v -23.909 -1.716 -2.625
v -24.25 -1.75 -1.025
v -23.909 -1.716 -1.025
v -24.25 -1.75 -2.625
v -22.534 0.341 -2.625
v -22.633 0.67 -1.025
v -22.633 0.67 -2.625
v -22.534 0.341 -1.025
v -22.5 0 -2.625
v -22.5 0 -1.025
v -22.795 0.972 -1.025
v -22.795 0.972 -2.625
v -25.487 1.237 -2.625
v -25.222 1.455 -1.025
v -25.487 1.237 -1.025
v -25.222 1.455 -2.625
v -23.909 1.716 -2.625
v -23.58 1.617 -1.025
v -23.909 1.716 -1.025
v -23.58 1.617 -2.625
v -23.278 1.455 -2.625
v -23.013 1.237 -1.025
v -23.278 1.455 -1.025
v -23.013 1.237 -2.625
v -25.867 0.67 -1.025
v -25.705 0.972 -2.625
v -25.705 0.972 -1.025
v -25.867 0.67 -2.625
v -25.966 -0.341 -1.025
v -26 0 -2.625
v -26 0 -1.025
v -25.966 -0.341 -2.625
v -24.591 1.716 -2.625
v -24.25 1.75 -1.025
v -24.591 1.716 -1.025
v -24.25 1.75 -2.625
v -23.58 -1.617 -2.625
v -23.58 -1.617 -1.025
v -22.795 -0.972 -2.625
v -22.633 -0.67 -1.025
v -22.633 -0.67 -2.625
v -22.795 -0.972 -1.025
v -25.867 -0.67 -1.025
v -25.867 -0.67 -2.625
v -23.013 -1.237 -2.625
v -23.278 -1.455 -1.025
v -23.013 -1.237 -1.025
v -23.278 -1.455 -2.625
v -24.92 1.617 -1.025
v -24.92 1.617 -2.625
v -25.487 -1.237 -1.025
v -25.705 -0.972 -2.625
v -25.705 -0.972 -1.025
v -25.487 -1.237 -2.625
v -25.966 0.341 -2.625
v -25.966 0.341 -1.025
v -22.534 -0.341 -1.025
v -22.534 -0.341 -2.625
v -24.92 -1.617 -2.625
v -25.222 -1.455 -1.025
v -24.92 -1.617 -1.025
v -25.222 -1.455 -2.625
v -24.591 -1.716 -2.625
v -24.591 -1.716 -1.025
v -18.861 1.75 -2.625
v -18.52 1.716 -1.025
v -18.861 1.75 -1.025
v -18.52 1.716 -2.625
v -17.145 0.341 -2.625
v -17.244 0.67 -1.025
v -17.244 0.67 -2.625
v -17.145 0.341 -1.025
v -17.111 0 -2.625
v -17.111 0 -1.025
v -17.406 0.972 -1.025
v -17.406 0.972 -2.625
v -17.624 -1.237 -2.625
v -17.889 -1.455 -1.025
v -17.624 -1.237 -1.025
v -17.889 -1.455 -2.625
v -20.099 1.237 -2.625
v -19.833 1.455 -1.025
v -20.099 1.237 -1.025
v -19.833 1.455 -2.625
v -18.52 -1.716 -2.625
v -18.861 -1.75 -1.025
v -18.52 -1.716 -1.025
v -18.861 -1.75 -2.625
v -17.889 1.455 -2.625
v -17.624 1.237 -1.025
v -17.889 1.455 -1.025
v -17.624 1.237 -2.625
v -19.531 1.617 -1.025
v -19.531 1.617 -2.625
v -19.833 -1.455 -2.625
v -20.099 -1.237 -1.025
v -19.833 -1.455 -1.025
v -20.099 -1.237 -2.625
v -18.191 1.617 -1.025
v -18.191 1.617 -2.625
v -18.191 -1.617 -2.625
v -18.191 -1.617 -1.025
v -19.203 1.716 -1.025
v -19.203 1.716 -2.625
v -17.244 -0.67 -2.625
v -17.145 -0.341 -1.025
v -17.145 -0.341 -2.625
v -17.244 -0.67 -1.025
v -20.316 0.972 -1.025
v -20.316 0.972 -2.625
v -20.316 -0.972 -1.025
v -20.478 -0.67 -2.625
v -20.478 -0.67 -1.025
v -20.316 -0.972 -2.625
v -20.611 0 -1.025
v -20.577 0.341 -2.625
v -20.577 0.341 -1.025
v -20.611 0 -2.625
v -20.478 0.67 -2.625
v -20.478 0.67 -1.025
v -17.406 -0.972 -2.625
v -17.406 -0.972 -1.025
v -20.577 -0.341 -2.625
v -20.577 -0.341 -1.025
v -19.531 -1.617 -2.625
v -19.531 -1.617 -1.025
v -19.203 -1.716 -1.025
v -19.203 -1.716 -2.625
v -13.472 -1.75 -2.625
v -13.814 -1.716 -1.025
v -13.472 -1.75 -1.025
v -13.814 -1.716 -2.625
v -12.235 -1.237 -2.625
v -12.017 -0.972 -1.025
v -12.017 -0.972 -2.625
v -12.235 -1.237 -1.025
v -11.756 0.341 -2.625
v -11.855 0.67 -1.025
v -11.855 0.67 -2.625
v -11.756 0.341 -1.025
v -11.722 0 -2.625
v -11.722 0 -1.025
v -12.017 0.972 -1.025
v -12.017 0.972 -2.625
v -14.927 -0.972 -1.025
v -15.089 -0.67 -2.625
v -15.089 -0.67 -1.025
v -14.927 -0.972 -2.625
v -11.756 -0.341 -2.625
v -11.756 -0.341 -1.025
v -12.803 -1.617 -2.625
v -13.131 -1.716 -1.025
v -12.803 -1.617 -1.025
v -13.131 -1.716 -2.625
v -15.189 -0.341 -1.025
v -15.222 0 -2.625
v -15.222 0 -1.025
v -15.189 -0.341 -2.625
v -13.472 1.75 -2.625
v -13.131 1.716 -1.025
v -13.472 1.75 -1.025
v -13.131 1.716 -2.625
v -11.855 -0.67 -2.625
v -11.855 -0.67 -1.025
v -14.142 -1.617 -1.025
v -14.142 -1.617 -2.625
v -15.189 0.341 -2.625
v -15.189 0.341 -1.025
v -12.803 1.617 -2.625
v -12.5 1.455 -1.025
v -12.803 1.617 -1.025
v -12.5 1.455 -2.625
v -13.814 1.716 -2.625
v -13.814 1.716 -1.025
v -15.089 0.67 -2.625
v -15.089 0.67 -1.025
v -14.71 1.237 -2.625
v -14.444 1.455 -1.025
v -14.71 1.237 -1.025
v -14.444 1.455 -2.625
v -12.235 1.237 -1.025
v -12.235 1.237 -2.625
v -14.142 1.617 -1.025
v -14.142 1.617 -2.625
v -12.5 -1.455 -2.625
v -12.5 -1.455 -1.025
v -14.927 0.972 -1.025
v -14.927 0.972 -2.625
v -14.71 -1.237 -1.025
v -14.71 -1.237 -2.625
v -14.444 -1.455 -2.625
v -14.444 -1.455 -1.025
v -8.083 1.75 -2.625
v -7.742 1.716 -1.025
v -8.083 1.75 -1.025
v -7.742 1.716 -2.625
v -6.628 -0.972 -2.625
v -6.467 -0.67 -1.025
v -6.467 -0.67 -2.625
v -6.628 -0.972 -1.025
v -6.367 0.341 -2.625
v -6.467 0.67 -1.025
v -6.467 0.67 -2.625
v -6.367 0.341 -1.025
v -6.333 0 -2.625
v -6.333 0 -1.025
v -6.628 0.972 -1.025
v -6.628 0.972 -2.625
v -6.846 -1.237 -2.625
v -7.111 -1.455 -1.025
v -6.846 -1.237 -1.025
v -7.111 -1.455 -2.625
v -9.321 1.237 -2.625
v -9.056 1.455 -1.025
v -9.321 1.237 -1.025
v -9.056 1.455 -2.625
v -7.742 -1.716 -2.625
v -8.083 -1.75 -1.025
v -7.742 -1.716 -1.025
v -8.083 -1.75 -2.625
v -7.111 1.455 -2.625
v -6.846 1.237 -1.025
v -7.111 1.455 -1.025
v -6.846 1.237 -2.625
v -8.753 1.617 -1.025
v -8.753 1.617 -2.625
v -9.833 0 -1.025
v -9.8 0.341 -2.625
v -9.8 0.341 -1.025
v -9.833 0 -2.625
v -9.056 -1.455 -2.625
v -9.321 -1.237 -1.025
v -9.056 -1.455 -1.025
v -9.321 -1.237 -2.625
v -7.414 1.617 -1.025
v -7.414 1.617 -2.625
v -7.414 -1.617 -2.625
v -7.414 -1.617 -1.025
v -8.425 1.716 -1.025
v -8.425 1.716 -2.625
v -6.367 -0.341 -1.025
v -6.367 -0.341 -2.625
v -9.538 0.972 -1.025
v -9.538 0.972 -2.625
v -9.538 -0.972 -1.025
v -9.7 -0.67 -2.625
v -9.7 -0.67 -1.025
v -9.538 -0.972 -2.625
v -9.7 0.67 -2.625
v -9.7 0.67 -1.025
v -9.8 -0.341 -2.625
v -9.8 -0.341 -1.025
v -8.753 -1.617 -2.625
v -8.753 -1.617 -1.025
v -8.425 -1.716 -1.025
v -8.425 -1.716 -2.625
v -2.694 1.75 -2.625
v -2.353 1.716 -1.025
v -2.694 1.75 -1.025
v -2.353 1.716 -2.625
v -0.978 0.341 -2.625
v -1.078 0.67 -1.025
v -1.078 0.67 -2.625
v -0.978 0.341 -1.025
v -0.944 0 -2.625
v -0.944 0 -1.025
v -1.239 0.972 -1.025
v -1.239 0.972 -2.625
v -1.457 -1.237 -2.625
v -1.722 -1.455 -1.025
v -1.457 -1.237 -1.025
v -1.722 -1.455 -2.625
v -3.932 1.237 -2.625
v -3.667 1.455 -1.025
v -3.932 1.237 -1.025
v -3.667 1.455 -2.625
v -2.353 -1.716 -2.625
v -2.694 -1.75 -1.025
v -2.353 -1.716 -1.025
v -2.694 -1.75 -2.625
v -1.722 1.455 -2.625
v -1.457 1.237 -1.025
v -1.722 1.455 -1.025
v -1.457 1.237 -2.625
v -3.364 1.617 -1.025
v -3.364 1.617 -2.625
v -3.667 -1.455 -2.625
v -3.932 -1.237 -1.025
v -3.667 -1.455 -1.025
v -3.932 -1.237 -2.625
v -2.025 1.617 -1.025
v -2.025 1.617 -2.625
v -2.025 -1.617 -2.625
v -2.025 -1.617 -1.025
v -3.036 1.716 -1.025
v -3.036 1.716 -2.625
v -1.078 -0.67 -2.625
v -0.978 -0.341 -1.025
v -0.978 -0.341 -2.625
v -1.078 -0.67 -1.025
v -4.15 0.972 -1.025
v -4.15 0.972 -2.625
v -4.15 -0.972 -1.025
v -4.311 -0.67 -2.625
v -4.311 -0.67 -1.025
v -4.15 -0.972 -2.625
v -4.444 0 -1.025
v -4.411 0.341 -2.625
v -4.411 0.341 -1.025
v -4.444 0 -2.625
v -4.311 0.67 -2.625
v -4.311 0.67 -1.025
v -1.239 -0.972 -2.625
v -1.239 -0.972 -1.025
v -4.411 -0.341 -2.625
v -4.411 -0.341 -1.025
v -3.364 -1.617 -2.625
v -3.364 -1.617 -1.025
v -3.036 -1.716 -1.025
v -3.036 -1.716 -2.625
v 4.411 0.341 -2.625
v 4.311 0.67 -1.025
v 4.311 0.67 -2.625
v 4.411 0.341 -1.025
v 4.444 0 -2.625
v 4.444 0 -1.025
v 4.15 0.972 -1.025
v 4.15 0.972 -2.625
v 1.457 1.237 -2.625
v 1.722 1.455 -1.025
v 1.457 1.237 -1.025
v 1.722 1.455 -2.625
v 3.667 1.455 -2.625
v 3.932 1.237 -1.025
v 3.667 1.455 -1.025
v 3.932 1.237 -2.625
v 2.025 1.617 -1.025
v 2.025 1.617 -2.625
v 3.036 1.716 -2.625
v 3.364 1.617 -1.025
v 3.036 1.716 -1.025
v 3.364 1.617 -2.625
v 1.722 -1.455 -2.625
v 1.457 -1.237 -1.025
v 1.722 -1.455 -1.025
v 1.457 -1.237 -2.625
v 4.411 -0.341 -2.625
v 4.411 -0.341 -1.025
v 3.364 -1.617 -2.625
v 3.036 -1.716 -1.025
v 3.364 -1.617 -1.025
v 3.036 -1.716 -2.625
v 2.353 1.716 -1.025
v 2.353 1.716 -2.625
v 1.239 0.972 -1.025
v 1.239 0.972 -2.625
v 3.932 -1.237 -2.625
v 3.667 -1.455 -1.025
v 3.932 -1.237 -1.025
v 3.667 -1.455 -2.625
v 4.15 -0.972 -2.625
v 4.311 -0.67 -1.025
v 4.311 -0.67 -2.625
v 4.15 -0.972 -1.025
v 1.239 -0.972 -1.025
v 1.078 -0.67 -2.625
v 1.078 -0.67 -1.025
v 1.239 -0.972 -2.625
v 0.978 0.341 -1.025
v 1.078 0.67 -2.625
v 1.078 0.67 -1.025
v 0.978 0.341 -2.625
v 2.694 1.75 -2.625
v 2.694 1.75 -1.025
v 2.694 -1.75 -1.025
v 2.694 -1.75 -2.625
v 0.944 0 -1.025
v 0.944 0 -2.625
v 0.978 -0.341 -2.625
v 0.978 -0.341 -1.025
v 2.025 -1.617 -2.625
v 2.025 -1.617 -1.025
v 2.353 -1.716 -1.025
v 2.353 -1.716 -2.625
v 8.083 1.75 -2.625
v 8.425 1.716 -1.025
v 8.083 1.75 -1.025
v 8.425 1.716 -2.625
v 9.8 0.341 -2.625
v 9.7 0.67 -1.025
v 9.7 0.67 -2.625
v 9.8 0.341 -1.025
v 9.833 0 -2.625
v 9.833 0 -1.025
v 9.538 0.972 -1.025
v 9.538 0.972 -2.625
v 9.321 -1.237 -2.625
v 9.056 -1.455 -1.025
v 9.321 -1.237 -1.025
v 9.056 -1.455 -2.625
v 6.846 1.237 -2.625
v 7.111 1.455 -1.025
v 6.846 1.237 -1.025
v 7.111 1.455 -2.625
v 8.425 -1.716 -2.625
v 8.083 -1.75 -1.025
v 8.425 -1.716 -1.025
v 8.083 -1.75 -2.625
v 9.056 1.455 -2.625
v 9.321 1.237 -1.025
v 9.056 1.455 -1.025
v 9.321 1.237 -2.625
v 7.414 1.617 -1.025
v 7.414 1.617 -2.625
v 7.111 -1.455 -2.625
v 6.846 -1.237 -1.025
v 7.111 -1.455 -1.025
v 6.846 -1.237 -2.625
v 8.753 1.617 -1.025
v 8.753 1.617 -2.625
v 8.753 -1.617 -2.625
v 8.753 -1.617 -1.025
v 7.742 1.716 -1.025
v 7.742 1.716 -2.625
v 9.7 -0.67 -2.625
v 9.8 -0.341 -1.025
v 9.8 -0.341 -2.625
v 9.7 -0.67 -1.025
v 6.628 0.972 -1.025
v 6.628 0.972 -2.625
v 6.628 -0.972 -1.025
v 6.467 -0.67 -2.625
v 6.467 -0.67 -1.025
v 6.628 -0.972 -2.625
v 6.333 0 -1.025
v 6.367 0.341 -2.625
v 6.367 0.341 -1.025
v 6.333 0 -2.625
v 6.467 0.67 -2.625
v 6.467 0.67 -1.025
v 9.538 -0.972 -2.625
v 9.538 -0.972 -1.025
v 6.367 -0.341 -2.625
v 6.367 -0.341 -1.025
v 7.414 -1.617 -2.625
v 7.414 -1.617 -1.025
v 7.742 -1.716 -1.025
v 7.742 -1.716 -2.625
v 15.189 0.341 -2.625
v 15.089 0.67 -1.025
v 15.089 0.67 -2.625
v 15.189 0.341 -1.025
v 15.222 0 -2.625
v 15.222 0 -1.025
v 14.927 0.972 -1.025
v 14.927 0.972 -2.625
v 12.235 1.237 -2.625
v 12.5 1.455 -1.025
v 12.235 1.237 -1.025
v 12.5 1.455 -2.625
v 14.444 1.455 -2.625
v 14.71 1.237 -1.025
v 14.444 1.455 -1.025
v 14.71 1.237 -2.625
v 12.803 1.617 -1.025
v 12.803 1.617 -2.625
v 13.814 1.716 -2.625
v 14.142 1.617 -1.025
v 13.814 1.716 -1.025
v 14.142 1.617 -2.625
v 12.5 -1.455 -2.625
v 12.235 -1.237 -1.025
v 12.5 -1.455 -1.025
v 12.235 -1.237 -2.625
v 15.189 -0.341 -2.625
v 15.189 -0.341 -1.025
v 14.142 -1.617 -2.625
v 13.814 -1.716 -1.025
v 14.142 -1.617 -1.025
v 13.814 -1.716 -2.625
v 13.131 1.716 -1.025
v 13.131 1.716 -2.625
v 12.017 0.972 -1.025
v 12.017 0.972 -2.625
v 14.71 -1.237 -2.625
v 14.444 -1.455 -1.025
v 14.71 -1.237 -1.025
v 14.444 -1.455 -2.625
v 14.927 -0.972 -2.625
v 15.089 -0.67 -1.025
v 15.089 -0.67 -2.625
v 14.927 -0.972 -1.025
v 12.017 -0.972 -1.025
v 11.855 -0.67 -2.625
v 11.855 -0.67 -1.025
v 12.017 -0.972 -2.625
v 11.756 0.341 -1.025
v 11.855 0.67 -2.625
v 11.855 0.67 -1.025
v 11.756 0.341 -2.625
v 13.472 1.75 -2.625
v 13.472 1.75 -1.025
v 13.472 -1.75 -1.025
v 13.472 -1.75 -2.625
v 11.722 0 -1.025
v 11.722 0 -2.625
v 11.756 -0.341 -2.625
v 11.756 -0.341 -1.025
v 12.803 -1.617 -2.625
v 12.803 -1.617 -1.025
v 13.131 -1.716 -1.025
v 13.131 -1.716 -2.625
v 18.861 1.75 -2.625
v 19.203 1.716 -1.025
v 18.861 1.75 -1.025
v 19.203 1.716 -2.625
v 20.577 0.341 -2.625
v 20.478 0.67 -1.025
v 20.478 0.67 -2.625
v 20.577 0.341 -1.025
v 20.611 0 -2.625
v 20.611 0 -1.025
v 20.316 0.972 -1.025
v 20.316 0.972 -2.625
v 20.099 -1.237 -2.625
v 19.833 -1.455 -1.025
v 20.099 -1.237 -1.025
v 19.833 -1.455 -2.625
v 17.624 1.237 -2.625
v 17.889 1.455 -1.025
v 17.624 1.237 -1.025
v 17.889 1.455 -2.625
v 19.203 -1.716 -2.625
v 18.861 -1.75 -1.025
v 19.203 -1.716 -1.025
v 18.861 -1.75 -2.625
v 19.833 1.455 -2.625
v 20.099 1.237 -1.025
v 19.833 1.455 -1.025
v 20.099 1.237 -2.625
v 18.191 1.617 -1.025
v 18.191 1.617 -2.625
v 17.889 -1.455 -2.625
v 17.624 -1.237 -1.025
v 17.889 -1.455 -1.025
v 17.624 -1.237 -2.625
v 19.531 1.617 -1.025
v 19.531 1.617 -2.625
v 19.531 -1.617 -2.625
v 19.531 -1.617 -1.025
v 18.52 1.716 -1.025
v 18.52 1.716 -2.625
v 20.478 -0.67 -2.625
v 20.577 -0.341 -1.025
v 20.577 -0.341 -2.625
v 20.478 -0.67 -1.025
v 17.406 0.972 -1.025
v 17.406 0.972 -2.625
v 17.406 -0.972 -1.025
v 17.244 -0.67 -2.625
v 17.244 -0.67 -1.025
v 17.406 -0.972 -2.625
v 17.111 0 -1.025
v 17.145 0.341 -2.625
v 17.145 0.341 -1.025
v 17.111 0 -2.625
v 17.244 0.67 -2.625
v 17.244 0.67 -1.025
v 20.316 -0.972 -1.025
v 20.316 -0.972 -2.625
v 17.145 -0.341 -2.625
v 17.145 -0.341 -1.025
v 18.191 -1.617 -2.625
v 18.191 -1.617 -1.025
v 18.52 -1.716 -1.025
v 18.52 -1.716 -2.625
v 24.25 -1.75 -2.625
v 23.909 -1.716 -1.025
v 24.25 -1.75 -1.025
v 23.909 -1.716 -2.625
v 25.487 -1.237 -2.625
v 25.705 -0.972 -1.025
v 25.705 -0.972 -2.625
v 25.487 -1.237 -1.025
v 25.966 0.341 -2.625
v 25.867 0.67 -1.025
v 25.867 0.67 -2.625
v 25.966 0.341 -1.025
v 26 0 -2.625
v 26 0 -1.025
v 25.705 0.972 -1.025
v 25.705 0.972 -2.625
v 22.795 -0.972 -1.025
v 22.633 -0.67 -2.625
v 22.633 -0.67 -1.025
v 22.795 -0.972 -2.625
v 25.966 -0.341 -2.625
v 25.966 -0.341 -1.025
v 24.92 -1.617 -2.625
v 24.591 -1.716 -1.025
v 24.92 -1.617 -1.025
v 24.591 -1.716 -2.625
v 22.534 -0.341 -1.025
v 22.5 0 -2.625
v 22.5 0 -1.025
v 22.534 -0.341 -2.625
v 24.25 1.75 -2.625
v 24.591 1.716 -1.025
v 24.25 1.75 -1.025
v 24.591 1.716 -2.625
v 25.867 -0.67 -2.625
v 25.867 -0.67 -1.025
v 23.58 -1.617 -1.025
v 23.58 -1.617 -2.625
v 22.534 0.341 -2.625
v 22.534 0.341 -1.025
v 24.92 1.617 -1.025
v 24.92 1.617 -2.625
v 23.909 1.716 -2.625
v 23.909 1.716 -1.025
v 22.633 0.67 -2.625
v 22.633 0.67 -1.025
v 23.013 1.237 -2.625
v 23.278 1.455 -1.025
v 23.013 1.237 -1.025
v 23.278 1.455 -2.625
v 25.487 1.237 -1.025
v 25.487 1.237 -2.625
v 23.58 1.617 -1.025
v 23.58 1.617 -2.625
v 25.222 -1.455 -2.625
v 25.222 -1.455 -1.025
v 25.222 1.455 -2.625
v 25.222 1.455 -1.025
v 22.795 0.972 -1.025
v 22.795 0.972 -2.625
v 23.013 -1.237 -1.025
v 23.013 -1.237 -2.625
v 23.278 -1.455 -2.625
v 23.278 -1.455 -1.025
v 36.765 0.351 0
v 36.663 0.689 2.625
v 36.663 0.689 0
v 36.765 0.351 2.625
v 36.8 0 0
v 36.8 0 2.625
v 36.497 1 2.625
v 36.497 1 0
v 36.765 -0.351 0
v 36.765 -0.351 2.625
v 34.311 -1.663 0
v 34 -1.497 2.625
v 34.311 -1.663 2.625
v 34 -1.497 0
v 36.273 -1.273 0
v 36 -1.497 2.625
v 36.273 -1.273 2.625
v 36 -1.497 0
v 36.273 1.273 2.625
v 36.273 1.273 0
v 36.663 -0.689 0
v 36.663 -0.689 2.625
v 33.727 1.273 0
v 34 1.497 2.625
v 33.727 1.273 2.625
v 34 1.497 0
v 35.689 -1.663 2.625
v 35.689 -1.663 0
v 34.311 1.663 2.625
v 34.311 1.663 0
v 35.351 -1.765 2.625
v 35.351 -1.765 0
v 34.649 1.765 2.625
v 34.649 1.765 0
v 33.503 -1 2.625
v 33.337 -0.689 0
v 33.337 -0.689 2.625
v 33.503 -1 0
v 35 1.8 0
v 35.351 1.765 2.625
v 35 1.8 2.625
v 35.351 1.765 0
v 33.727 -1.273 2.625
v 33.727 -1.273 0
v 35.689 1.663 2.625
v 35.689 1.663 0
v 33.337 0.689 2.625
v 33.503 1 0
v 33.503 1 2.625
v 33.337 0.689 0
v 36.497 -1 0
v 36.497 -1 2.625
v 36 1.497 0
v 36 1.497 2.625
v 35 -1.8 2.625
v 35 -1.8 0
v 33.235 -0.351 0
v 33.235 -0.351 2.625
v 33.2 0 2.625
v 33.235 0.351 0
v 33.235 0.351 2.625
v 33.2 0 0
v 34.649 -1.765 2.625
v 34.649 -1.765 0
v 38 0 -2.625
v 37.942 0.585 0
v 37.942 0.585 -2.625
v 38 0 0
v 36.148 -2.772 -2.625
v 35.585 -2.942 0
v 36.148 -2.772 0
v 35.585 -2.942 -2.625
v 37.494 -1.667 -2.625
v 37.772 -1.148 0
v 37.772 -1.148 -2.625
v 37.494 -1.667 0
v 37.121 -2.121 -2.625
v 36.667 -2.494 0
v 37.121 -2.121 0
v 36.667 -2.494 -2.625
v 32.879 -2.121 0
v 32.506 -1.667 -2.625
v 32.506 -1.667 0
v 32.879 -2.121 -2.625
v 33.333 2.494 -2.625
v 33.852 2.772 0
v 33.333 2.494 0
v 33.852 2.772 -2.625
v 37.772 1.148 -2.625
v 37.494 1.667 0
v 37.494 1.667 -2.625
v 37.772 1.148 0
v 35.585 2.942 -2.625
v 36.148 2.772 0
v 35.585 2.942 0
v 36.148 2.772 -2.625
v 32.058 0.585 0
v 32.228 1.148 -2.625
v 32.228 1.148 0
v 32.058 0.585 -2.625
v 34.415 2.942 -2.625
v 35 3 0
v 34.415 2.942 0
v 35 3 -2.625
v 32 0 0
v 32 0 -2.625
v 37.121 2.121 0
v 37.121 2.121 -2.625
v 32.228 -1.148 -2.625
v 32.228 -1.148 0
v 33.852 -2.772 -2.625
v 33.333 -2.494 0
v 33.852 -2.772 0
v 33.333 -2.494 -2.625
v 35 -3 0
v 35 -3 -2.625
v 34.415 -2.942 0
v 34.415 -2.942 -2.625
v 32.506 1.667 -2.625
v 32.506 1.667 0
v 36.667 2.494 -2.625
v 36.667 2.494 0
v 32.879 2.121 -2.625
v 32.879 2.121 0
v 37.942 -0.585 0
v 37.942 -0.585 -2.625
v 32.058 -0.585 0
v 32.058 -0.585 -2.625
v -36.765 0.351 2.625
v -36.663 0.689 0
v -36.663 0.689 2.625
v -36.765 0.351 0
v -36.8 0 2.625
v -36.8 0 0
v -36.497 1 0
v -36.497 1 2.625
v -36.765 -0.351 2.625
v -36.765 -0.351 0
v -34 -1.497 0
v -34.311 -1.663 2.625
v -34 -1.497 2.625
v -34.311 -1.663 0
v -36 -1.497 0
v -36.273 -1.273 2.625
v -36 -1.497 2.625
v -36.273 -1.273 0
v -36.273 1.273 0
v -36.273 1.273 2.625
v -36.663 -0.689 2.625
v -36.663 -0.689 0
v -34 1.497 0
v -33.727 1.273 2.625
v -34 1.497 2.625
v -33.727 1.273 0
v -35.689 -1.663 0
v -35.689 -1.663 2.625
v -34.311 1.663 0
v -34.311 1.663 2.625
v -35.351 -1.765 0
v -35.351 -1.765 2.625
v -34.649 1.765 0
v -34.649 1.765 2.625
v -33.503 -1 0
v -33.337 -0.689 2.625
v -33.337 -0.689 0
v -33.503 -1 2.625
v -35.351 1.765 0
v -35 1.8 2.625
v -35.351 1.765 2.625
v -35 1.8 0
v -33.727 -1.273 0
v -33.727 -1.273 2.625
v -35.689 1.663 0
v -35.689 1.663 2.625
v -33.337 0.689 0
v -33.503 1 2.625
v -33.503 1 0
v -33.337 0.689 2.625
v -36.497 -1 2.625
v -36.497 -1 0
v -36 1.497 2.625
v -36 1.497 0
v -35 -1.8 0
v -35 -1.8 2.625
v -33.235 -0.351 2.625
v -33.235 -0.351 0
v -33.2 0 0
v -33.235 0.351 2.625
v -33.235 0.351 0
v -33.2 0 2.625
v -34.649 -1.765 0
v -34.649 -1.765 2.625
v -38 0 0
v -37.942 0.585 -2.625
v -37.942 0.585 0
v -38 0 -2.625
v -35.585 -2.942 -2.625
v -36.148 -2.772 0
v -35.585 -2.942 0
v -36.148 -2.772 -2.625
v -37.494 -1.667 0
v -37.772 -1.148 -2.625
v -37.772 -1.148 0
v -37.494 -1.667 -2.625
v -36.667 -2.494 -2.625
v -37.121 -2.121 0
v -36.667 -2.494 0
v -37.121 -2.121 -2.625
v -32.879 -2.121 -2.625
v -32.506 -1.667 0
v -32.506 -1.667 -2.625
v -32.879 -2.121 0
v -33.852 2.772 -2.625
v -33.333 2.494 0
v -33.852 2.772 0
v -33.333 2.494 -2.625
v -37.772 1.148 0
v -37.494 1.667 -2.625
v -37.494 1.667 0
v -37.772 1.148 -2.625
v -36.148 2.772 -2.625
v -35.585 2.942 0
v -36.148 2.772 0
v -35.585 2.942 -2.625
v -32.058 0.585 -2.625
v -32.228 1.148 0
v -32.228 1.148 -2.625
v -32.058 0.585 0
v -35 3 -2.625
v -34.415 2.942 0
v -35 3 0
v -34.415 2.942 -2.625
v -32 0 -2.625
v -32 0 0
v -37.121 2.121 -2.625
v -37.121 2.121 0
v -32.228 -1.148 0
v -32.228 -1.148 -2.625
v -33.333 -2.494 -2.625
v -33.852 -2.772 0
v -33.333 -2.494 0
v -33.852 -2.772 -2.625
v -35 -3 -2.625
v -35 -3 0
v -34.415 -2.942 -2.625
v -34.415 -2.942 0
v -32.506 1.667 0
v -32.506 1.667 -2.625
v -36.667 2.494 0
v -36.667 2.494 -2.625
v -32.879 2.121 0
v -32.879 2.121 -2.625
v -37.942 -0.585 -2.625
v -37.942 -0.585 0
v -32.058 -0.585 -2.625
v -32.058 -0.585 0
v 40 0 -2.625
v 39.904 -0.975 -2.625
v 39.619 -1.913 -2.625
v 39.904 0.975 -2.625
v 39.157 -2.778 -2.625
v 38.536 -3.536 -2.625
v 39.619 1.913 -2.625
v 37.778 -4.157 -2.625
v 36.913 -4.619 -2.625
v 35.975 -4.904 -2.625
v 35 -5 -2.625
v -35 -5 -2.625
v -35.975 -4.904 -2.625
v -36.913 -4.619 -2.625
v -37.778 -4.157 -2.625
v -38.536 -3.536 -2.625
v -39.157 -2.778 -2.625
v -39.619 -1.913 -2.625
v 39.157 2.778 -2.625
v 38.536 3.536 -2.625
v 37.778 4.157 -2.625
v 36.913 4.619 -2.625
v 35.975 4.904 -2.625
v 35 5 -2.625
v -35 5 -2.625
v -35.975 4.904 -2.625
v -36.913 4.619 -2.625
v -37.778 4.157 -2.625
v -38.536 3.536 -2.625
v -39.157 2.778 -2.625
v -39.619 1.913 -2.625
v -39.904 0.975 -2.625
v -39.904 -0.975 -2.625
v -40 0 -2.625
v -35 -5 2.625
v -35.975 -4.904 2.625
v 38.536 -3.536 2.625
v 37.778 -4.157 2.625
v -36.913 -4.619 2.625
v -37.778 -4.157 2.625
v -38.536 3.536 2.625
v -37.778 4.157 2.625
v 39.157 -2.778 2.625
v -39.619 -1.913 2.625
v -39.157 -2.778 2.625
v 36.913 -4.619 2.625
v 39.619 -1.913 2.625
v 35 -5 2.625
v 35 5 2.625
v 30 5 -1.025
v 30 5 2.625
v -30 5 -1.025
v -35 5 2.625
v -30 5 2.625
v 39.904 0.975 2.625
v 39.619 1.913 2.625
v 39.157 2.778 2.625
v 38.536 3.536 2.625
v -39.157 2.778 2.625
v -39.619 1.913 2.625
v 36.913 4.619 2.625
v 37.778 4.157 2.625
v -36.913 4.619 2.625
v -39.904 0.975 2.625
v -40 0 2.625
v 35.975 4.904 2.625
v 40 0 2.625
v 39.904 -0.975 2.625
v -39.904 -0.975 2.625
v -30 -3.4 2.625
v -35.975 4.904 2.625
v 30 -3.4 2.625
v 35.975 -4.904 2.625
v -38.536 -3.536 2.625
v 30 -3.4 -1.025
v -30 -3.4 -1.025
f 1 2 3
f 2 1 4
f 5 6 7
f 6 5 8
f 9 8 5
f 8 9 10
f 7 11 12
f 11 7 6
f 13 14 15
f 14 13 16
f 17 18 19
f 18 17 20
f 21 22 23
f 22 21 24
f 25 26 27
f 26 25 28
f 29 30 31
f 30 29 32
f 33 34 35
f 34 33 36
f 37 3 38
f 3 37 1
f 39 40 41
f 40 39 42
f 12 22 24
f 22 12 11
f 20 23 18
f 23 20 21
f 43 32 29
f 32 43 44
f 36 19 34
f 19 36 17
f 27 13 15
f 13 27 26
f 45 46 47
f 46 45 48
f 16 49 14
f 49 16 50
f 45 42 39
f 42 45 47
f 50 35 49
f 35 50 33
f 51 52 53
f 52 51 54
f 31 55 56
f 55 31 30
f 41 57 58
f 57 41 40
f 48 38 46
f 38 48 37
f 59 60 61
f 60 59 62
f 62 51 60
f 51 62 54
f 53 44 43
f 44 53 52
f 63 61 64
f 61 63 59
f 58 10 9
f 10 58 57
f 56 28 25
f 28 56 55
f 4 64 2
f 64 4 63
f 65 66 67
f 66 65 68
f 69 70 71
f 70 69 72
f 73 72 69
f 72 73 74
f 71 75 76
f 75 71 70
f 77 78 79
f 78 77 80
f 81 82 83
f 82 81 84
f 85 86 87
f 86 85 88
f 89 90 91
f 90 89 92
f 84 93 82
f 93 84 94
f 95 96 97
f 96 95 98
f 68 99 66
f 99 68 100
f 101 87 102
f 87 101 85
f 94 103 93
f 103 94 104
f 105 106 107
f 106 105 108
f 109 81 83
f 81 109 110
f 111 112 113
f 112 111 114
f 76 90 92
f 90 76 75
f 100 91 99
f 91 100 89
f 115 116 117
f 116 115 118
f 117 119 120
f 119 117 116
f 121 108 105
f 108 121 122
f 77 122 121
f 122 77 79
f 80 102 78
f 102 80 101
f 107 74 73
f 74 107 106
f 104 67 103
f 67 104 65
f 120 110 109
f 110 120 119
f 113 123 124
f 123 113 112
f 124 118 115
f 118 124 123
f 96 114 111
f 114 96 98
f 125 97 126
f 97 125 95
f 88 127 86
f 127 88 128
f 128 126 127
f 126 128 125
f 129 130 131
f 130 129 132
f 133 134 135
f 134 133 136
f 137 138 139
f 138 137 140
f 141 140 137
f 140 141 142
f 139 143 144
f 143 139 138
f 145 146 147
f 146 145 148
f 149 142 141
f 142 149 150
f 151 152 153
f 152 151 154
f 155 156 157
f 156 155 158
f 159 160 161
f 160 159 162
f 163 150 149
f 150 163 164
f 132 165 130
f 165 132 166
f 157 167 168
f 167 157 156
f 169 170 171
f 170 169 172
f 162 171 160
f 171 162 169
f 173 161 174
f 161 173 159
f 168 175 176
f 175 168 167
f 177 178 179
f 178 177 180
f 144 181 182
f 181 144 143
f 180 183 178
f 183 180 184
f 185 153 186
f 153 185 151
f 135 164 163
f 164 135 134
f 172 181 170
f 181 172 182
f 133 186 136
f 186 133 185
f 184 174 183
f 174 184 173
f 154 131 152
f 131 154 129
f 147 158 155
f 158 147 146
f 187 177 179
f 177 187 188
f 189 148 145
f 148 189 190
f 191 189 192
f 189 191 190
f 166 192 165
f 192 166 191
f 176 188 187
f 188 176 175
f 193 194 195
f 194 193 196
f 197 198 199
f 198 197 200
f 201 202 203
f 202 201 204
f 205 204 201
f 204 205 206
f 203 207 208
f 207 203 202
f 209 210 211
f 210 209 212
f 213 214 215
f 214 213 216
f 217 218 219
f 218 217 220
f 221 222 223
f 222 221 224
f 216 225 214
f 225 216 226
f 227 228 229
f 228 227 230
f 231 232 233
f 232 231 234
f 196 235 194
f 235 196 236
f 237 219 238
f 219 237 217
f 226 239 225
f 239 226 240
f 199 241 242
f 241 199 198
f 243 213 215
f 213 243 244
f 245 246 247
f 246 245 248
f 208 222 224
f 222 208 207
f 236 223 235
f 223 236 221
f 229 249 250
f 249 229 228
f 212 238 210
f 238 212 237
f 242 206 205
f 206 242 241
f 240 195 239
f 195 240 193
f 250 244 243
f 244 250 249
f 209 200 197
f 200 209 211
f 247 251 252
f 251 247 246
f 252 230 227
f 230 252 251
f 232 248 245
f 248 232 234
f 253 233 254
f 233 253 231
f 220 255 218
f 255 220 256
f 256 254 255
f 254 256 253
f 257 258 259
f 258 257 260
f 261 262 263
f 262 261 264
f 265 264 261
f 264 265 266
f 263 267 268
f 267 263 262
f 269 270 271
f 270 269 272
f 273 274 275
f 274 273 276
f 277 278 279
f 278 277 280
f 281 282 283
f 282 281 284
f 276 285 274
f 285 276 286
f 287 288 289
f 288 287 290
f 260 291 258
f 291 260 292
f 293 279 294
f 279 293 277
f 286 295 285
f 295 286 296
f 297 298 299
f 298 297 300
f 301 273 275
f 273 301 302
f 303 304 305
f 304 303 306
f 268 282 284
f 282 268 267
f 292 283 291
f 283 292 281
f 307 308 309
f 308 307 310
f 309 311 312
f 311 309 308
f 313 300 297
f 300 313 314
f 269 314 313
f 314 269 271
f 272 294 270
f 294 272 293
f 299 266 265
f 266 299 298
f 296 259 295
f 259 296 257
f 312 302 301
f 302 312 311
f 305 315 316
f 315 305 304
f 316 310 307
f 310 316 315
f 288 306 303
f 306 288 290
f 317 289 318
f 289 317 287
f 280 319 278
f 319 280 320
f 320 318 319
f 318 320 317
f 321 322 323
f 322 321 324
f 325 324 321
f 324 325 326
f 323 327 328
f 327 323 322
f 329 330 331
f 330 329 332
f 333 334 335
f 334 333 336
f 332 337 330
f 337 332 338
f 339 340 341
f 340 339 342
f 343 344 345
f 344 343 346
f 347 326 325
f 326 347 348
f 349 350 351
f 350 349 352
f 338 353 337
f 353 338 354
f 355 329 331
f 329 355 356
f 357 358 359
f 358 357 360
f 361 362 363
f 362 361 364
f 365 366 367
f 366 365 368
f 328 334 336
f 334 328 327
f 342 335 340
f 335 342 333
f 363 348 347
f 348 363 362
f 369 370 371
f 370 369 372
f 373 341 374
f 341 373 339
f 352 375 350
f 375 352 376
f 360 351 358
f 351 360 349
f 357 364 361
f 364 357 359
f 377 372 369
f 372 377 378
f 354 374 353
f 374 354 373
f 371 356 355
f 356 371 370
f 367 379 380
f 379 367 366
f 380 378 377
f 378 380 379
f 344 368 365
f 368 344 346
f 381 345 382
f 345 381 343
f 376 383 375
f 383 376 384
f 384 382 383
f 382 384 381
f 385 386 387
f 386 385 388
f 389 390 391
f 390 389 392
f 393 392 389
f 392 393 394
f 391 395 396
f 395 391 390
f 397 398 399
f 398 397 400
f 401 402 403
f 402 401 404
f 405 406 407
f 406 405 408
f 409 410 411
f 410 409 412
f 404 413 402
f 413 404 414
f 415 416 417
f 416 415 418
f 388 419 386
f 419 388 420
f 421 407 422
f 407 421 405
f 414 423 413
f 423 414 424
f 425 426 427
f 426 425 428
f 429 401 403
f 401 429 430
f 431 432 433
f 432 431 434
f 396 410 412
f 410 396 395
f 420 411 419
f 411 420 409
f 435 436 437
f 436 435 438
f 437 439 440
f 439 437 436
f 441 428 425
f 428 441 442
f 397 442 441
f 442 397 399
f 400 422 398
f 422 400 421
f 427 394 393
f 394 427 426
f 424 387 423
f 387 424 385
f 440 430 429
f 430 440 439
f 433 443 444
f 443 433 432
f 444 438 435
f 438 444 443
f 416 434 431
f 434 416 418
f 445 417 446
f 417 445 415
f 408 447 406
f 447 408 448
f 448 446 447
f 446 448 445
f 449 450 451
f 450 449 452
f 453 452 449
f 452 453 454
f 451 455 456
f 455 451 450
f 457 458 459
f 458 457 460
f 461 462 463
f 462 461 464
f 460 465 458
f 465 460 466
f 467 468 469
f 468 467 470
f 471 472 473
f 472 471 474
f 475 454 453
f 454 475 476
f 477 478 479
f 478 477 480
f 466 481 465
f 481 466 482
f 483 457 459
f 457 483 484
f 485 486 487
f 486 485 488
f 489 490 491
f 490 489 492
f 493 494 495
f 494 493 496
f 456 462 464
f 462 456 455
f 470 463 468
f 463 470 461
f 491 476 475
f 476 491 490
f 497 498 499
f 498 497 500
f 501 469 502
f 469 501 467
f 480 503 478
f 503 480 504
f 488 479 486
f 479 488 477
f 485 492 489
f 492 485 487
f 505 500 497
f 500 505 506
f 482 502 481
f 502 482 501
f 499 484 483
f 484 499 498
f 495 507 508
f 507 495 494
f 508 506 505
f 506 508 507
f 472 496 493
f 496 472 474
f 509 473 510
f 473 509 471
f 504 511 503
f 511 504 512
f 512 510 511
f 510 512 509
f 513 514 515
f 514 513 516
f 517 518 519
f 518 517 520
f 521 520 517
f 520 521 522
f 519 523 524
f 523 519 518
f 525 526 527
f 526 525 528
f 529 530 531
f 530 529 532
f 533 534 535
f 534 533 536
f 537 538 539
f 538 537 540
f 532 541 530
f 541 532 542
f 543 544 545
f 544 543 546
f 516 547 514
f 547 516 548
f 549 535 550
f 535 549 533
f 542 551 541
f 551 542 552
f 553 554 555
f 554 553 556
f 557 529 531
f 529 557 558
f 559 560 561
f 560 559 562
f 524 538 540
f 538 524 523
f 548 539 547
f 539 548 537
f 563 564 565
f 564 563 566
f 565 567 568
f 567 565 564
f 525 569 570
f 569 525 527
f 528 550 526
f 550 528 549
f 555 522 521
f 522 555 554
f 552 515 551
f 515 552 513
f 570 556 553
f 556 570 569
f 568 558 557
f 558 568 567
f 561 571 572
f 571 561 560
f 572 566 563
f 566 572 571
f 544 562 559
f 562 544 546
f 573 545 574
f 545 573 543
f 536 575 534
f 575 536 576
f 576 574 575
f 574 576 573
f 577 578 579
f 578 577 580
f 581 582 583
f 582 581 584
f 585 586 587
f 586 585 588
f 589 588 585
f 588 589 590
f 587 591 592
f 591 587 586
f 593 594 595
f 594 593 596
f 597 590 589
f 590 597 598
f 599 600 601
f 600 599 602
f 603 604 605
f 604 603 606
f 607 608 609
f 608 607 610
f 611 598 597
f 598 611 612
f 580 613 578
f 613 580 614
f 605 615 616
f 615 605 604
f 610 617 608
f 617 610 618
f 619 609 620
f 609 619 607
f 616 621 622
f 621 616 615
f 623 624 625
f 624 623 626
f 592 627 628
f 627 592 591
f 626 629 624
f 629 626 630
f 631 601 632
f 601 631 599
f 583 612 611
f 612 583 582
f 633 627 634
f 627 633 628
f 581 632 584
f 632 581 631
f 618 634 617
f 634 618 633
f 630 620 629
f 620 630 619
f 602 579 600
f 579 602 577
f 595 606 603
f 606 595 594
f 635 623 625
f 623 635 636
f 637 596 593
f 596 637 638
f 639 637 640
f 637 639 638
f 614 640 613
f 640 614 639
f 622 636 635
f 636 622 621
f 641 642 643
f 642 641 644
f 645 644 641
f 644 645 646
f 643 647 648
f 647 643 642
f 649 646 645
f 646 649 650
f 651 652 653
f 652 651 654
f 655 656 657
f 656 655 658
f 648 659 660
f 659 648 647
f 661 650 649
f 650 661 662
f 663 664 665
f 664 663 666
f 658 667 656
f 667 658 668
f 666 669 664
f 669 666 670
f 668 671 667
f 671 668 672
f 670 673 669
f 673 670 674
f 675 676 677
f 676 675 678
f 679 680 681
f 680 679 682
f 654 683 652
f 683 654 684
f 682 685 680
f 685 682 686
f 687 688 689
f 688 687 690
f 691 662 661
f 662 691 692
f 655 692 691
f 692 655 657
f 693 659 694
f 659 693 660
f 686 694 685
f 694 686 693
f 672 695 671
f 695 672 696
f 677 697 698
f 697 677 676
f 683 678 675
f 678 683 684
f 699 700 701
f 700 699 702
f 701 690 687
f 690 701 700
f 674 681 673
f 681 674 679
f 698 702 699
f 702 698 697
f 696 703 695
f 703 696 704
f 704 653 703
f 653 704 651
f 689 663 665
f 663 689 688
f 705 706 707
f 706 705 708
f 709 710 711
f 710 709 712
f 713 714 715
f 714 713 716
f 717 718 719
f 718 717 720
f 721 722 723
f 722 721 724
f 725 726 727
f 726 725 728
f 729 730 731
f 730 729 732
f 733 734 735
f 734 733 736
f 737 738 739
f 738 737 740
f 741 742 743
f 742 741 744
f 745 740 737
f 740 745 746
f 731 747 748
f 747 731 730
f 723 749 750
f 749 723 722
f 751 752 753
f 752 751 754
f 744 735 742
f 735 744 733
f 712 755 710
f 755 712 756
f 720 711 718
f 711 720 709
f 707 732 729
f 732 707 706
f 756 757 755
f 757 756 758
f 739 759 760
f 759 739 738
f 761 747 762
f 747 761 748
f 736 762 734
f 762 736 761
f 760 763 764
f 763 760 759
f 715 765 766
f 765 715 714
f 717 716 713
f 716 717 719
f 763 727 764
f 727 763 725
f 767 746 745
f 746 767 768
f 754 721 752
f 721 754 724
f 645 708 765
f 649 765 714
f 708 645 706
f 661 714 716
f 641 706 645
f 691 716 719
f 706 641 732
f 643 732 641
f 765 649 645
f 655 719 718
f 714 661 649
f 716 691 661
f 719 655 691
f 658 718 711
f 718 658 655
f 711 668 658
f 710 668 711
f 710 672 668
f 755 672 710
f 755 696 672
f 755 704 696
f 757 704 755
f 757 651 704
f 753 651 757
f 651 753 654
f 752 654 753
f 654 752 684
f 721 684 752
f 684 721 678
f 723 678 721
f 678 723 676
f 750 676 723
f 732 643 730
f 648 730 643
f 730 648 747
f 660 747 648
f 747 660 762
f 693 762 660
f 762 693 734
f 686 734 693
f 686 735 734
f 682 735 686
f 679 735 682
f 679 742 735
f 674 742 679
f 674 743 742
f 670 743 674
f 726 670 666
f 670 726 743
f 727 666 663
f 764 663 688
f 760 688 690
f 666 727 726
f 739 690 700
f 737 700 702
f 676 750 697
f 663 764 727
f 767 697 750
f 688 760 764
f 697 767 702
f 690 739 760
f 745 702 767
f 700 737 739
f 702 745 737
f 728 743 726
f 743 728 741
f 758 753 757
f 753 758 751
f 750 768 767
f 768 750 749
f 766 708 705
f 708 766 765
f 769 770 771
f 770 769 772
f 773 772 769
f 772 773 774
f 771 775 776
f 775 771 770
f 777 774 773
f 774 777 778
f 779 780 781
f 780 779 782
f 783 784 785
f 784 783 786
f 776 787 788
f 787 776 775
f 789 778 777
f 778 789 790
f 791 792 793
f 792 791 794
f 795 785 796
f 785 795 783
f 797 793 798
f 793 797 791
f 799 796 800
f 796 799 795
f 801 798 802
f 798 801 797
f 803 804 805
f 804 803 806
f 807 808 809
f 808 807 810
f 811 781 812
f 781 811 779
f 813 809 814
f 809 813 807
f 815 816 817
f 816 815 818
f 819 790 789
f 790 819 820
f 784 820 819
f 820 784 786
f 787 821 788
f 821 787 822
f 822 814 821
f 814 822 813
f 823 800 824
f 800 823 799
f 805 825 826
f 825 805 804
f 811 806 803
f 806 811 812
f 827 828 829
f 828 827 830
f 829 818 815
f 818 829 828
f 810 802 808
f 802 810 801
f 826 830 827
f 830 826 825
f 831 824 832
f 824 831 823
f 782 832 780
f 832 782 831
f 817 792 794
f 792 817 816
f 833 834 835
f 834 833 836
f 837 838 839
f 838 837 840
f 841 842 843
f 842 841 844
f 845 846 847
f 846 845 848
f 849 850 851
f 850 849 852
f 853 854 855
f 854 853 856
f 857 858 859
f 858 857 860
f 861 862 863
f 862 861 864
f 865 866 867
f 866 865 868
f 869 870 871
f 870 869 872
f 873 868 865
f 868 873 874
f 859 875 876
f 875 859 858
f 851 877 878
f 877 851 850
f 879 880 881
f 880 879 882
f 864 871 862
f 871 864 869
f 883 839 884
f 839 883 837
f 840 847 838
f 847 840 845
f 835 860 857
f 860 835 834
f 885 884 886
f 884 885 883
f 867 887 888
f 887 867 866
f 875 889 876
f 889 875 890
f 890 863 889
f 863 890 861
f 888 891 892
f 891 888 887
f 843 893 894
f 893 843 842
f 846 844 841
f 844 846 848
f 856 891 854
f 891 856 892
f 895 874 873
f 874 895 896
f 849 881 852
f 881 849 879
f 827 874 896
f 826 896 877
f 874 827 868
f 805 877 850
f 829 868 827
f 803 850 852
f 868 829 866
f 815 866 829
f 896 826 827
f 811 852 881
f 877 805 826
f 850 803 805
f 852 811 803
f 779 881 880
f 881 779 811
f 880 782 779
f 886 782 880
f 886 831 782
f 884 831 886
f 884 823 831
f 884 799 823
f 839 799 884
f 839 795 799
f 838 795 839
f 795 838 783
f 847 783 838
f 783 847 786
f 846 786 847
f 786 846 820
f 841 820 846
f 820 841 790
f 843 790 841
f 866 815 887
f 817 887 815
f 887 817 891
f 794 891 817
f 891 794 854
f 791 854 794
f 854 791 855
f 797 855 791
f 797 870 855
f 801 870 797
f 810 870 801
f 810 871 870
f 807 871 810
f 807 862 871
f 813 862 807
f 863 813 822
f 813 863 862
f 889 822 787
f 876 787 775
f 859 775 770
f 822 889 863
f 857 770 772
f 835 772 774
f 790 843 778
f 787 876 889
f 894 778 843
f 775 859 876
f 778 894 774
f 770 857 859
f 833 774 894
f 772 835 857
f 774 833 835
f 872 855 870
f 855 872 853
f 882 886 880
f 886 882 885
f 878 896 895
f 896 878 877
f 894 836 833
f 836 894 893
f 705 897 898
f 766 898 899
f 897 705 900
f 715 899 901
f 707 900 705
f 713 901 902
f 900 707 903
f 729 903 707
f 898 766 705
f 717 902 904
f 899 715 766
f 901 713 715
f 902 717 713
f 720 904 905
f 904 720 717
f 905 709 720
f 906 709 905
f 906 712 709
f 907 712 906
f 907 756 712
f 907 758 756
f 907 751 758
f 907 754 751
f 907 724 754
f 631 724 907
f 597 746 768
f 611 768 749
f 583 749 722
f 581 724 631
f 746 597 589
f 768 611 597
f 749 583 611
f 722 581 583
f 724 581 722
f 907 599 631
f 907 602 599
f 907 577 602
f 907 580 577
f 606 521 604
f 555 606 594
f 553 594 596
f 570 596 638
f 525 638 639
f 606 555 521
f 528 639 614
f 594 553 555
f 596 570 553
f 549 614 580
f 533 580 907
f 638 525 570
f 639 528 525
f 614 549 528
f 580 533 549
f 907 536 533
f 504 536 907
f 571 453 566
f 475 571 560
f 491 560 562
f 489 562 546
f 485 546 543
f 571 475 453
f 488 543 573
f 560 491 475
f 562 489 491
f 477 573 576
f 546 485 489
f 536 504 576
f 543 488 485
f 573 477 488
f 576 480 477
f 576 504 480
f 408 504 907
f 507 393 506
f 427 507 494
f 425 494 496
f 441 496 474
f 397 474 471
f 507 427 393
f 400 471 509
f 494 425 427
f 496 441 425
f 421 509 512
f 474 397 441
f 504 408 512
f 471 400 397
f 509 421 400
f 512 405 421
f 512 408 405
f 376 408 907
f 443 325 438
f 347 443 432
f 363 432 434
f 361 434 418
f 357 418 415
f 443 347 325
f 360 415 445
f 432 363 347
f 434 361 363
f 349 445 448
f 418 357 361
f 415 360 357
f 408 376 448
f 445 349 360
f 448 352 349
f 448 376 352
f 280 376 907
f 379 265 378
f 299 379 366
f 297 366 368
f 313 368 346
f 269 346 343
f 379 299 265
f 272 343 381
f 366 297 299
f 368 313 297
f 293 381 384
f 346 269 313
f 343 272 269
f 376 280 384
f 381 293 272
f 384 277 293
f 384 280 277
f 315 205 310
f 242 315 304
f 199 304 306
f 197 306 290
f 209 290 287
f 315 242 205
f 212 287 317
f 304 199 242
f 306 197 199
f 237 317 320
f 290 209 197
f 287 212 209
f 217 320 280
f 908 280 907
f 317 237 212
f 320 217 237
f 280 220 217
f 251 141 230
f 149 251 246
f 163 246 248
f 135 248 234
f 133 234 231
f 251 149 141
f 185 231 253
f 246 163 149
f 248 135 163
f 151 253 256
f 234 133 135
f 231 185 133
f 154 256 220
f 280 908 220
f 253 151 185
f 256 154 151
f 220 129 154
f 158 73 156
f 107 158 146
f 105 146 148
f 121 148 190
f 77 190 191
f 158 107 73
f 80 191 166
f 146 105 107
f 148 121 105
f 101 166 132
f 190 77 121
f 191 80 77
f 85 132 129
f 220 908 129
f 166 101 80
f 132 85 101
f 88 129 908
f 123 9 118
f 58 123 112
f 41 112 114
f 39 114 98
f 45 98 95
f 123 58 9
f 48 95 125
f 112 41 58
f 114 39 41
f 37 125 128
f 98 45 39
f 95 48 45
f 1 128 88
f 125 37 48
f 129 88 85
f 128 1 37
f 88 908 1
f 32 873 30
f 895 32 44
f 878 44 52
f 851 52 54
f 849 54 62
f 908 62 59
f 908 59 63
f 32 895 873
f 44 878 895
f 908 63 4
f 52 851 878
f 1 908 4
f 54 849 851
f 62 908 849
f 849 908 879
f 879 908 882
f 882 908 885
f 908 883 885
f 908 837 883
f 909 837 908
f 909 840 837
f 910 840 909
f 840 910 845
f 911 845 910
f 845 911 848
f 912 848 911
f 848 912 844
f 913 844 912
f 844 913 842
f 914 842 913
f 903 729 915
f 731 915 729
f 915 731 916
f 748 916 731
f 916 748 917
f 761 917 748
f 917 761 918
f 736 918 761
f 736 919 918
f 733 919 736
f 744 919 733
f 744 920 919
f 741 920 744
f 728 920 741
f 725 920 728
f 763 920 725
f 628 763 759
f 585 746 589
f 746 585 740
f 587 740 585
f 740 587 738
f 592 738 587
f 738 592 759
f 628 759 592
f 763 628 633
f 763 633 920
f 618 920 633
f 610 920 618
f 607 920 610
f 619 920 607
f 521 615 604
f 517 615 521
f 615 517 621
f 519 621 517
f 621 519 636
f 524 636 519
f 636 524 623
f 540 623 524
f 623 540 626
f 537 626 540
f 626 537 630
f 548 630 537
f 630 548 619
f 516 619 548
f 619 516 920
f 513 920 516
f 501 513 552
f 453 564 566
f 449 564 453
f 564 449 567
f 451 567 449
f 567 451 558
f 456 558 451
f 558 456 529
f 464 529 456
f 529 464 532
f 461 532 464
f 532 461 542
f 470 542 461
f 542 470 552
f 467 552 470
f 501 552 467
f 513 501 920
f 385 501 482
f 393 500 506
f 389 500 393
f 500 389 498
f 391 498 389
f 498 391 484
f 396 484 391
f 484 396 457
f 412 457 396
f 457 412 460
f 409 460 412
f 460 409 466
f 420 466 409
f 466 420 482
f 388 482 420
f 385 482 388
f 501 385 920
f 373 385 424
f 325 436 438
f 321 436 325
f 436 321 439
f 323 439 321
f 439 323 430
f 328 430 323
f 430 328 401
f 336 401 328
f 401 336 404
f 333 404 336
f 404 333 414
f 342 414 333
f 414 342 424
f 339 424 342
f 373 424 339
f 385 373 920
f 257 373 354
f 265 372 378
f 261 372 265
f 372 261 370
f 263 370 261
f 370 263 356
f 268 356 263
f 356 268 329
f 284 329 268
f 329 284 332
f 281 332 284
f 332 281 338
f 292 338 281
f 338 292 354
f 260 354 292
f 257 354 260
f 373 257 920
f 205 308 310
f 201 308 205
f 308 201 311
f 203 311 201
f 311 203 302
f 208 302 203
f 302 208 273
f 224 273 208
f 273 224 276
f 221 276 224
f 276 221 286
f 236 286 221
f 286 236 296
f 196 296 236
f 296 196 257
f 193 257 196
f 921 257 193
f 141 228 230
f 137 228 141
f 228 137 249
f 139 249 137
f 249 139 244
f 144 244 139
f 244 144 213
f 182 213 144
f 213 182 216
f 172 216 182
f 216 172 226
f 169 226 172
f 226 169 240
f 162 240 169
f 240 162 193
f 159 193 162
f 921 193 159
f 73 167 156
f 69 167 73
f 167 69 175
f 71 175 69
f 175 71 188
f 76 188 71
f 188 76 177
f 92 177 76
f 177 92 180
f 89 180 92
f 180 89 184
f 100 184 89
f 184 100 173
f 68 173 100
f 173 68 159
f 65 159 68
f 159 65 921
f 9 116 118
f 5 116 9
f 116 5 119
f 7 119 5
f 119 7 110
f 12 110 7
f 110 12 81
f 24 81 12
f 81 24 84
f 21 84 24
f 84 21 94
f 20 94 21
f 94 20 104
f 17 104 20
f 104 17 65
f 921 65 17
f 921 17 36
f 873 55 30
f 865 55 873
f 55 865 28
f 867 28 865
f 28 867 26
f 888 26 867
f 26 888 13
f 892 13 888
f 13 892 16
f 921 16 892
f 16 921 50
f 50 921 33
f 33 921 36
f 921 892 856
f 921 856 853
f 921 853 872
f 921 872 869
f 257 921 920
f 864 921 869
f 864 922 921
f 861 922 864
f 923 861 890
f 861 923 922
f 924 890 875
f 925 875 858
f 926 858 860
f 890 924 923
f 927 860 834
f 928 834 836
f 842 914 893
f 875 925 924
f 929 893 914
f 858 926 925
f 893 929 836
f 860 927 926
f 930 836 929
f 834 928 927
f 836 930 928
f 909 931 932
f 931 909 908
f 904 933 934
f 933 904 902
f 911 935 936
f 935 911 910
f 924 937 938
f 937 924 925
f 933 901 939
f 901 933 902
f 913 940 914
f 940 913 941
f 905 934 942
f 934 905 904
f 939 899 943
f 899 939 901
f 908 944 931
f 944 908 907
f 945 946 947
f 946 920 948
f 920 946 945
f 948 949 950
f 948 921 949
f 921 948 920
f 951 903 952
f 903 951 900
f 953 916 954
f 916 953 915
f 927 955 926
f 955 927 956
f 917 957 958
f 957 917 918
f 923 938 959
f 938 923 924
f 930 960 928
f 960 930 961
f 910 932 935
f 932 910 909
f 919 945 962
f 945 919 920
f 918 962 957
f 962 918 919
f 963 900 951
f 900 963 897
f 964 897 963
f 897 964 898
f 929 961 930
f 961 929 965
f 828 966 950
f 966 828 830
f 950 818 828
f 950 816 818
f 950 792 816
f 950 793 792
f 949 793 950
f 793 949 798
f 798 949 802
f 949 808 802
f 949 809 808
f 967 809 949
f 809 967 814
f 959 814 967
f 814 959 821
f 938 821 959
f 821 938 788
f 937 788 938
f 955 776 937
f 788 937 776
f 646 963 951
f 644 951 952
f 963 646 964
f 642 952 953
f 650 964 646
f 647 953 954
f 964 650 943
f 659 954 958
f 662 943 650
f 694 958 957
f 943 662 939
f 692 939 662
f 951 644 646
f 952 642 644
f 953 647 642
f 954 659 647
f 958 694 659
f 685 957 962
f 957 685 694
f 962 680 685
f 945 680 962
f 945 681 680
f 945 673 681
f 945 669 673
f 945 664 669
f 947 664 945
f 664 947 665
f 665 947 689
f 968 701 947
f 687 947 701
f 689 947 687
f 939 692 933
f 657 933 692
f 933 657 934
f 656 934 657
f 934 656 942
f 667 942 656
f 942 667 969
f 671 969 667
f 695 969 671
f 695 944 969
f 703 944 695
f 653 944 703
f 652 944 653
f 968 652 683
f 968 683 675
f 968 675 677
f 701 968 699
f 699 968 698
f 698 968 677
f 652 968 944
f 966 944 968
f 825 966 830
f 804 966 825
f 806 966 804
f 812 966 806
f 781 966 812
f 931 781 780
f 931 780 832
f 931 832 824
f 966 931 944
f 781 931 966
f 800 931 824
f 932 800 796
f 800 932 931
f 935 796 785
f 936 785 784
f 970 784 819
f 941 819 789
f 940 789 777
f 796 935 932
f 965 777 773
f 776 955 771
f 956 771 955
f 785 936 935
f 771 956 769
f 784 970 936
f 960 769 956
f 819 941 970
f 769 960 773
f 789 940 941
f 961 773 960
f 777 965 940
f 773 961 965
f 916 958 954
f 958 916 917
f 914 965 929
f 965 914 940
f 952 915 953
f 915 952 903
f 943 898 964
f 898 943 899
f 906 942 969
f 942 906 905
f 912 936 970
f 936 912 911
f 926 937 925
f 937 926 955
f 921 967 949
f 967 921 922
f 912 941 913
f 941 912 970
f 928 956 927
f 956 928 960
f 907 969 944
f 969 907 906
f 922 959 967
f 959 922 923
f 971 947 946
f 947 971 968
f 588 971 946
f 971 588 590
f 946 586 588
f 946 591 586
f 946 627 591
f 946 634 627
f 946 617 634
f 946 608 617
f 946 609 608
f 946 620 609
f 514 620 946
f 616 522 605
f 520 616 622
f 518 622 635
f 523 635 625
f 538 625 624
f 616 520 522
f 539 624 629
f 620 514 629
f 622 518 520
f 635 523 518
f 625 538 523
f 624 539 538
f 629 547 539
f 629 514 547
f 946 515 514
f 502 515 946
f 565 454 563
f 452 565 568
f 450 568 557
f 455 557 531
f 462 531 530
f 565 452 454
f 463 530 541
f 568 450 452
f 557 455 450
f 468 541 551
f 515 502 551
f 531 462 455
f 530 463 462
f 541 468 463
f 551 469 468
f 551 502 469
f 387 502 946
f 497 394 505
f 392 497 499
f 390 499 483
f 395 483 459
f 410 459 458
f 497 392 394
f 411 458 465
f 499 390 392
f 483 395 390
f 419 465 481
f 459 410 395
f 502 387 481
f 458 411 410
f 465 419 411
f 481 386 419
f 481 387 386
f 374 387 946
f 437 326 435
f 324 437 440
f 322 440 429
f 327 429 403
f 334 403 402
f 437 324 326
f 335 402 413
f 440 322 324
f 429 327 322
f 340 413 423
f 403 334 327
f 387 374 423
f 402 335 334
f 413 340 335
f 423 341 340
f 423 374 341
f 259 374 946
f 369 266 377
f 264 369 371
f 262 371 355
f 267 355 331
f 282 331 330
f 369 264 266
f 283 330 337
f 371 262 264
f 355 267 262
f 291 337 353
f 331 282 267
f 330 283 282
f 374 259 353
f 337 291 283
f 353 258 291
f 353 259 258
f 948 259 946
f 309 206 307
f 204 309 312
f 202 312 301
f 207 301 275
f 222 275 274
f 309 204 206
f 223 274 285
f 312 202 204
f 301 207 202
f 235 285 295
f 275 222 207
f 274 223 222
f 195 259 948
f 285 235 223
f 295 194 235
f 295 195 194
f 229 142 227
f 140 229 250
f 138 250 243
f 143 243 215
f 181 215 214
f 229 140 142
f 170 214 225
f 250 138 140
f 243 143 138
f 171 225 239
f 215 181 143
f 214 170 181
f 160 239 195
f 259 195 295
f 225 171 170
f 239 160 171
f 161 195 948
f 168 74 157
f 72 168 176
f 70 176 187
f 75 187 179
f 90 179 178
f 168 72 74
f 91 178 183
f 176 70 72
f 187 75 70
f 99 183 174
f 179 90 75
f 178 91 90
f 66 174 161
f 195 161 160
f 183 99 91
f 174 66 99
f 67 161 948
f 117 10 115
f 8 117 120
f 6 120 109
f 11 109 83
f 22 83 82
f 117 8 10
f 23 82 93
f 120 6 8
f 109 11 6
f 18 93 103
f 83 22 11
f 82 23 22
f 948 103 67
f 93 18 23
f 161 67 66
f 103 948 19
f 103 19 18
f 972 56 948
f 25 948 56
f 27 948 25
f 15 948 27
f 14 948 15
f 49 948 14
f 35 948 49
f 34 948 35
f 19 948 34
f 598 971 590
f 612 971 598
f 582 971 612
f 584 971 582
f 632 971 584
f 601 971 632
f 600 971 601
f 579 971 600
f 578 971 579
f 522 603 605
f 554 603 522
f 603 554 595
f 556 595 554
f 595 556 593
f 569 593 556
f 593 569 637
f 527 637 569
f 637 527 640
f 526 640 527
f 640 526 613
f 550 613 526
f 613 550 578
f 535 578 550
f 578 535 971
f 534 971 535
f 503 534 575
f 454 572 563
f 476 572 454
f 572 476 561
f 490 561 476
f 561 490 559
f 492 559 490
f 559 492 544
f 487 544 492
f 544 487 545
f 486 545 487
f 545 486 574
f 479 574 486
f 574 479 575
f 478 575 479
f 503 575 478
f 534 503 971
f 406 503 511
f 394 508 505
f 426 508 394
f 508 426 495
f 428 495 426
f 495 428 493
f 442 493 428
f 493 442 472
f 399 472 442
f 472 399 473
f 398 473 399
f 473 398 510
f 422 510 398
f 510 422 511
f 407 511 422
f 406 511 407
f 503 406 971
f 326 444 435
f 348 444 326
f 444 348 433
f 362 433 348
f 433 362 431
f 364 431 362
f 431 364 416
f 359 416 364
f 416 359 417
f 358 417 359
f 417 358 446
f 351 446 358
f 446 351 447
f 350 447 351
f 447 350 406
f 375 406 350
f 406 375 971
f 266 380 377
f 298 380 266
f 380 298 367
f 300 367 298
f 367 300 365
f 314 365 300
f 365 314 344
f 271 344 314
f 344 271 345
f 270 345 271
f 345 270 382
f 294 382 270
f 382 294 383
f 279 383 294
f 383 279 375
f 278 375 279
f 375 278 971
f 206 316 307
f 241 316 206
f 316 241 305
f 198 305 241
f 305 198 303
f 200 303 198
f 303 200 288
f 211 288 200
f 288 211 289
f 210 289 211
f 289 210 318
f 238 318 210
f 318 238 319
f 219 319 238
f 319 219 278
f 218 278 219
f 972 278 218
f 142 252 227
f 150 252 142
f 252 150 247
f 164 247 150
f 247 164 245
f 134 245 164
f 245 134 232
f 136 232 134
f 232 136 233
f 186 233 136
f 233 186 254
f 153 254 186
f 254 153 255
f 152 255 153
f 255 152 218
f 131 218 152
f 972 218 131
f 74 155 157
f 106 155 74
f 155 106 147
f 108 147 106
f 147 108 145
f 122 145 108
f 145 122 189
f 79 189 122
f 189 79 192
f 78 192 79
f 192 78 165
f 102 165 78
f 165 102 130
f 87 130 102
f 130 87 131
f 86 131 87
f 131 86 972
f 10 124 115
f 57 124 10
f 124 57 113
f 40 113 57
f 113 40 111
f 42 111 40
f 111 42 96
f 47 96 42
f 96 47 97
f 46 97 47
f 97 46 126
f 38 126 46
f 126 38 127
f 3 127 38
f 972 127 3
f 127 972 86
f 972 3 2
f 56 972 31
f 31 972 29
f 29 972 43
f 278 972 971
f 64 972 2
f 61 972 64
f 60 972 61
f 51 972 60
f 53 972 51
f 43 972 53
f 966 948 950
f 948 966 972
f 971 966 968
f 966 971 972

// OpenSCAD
// file: syms.scad
module symY(t) {
    translate(t)
        children();
    mirror([0,1,0])
        translate(t)
            children();
}
module symX(t) {
    translate(t)
        children();
    mirror([1,0,0])
        translate(t)
            children();
}

module symZ(t) {
    translate(t)
        children();
    mirror([0,0,1])
        translate(t)
            children();
}

module	symXY(t) {
	tx=t[0];
	ty=t[1];
	tz=t[2];
	symX([tx,0,0])
	symY([0,ty,tz])
		children();
}

module magnetCut(D,S) {
    cylinder(d=D,h=10);
    for(d=[45,-45])
    rotate(d)
    cube([2*D,S,30],center=true);
}


// calculates the radius from "segment" paramers:
// https://en.wikipedia.org/wiki/Circular_segment
function    circleSlice2radius2(c,h) = (c*c/8/h)+ h/2;

function toInt(str) = 
    let(d = [for (s = str) ord(s) - 48], l = len(d) - 1)
    [for (i = 0, a = d[i];i <= l;i = i + 1, a = 10 * a + d[i]) a][l];
        
// main file
use <syms.scad>
W=1.6;

$fn=32;

L=60;
K=10;

S=52;   
D=3.5; // led dia
Z=3.65;

E=K;

difference() {
    
    hull() {
        symX([L/2+K/2,0,0])
        cylinder(d=K,h=Z+W,center=true);
    }
    
    translate([0,W,W])
    cube([L,K,(Z+W)],center=true);
    
    N=10;
    A=S-D;
    for(i=[0:N-1]) {
        translate([(i-(N-1)/2)*A/(N-1),0,0])
            cylinder(d=D,center=true,h=K);
    }

    symX([L/2+K/2,0,0]) {
        cylinder(d=3.6,center=true,h=K);
        mirror([0,0,1])
        cylinder(d=6,h=K);
    }
    
}
